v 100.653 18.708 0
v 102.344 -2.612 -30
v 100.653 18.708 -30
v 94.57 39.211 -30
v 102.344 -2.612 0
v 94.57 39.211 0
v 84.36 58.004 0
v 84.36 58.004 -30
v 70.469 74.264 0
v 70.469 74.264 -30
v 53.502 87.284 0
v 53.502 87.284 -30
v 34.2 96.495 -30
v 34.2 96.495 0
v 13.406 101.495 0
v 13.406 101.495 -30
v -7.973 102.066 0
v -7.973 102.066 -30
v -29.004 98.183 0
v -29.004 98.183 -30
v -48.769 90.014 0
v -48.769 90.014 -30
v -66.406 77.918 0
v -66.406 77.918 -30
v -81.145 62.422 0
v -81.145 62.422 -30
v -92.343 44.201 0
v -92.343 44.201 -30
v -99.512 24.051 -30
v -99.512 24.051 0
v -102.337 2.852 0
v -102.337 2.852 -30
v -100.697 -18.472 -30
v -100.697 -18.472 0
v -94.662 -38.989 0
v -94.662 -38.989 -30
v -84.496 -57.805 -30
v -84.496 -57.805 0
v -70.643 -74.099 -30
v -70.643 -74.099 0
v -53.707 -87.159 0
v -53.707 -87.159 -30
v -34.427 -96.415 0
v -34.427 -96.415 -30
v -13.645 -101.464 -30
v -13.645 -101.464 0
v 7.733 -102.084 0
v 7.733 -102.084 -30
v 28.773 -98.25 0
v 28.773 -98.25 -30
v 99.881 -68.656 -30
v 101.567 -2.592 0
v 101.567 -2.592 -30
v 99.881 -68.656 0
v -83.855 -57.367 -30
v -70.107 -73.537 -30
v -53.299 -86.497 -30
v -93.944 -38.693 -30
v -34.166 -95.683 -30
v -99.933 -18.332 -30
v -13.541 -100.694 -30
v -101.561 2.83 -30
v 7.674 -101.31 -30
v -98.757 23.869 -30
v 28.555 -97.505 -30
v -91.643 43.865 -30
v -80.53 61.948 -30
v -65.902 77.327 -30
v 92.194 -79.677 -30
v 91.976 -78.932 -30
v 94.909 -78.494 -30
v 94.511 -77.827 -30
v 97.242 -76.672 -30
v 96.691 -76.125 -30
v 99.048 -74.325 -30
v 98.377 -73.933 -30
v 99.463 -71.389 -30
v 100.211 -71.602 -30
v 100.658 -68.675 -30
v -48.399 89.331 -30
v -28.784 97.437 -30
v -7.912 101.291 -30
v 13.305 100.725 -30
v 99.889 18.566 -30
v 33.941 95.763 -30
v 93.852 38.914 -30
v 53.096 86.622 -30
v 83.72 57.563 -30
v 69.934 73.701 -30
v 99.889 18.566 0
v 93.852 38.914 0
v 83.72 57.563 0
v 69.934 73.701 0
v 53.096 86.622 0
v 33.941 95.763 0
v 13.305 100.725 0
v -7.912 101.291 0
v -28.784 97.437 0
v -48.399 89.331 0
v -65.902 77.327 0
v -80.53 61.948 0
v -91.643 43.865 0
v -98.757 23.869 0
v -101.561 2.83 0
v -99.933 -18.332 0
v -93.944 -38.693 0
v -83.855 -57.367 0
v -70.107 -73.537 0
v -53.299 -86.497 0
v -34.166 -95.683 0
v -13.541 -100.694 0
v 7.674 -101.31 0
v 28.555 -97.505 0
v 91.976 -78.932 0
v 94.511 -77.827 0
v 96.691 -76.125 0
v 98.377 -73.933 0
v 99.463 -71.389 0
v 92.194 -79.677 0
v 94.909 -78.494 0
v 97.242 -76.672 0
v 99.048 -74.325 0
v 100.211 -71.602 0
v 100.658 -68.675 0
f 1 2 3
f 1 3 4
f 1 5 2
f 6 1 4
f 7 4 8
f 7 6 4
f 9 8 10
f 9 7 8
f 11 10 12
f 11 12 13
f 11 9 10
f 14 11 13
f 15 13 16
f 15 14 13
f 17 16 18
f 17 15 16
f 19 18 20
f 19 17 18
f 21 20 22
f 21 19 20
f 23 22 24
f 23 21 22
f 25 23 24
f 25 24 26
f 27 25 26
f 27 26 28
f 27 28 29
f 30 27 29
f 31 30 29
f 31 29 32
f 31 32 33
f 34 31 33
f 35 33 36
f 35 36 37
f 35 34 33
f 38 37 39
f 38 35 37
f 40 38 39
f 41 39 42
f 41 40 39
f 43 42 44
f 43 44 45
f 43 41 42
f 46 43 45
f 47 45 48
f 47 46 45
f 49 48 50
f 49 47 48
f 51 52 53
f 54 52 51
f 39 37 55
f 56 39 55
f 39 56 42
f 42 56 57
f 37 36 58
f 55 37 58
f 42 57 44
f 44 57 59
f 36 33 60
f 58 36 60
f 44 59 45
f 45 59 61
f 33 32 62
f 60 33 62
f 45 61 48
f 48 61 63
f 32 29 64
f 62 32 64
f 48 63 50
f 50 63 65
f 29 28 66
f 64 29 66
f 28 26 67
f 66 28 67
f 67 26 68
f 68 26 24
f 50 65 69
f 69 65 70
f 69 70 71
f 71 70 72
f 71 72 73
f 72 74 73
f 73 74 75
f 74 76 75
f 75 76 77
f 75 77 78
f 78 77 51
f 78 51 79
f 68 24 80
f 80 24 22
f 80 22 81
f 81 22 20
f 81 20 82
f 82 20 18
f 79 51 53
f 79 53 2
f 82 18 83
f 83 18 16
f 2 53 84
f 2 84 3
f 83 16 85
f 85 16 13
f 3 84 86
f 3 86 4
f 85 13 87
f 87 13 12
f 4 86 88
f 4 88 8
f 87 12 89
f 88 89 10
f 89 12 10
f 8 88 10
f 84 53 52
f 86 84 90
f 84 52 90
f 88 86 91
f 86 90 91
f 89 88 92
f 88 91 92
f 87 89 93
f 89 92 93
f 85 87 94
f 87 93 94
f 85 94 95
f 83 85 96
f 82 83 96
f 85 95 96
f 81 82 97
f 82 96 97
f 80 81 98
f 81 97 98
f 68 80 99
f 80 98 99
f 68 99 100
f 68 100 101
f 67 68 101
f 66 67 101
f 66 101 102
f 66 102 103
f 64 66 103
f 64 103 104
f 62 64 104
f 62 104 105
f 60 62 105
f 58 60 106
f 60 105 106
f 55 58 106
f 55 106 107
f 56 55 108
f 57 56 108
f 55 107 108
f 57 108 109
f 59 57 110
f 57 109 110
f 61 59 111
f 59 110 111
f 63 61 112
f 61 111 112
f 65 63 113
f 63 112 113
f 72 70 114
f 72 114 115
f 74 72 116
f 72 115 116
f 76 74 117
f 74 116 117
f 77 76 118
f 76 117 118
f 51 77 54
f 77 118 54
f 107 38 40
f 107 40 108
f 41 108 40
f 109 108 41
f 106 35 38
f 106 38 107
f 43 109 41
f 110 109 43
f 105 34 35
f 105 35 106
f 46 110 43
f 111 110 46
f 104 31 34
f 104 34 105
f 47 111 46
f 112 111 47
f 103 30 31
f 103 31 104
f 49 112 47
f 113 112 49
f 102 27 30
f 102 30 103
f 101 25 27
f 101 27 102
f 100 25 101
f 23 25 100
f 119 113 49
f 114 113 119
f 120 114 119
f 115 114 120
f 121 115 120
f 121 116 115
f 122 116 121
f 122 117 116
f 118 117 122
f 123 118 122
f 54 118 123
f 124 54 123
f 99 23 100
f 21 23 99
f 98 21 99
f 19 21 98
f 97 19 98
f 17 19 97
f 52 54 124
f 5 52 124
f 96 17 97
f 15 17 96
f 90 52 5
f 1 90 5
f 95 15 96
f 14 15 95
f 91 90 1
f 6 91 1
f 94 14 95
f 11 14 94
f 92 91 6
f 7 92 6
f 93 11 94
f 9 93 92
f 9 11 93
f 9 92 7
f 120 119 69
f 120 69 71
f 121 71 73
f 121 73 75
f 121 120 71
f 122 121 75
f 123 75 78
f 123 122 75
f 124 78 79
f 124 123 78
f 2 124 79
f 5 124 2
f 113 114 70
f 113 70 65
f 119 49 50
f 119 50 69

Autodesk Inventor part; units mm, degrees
ref_plane "YZ Plane" through (0, 0, 0) normal (1, 0, 0) x (0, 1, 0)
ref_plane "XZ Plane" through (0, 0, 0) normal (0, 1, 0) x (-1, 0, 0)
ref_plane "XY Plane" through (0, 0, 0) normal (0, 0, 1) x (1, 0, 0)
sketch "Sketch1" plane through (0, 0, 0) normal (0, 0, 1) x (1, 0, 0)
  circle A0 centre (0, 0) radius 101.6 construction
  arc A1 (78.464, -64.852) -> (82.3203, -59.5483) centre (88.8846, -68.3749) ccw construction
  line L0 (101.5669, -2.5919) -> (99.881, -68.6555)
  line L1 (91.9762, -78.9315) -> (28.5548, -97.5048)
  arc A2 (101.5669, -2.5919) -> (28.5548, -97.5048) centre (0, 0) ccw
  arc A3 (91.9762, -78.9315) -> (99.881, -68.6555) centre (88.8846, -68.3749) ccw
  line L2 (100.6577, -68.6753) -> (102.3436, -2.6117)
  arc A4 (102.3436, -2.6117) -> (28.7731, -98.2504) centre (0, 0) ccw
  line L3 (28.7731, -98.2504) -> (92.1945, -79.6771)
  arc A5 (92.1945, -79.6771) -> (100.6577, -68.6753) centre (88.8846, -68.3749) ccw
  point P0 (0, 0)
  dimension "d0" = 0.7769
extrude "Extrusion1" add sketch "Sketch1" against normal blind 30
properties part number "PoleHeightMarker"
